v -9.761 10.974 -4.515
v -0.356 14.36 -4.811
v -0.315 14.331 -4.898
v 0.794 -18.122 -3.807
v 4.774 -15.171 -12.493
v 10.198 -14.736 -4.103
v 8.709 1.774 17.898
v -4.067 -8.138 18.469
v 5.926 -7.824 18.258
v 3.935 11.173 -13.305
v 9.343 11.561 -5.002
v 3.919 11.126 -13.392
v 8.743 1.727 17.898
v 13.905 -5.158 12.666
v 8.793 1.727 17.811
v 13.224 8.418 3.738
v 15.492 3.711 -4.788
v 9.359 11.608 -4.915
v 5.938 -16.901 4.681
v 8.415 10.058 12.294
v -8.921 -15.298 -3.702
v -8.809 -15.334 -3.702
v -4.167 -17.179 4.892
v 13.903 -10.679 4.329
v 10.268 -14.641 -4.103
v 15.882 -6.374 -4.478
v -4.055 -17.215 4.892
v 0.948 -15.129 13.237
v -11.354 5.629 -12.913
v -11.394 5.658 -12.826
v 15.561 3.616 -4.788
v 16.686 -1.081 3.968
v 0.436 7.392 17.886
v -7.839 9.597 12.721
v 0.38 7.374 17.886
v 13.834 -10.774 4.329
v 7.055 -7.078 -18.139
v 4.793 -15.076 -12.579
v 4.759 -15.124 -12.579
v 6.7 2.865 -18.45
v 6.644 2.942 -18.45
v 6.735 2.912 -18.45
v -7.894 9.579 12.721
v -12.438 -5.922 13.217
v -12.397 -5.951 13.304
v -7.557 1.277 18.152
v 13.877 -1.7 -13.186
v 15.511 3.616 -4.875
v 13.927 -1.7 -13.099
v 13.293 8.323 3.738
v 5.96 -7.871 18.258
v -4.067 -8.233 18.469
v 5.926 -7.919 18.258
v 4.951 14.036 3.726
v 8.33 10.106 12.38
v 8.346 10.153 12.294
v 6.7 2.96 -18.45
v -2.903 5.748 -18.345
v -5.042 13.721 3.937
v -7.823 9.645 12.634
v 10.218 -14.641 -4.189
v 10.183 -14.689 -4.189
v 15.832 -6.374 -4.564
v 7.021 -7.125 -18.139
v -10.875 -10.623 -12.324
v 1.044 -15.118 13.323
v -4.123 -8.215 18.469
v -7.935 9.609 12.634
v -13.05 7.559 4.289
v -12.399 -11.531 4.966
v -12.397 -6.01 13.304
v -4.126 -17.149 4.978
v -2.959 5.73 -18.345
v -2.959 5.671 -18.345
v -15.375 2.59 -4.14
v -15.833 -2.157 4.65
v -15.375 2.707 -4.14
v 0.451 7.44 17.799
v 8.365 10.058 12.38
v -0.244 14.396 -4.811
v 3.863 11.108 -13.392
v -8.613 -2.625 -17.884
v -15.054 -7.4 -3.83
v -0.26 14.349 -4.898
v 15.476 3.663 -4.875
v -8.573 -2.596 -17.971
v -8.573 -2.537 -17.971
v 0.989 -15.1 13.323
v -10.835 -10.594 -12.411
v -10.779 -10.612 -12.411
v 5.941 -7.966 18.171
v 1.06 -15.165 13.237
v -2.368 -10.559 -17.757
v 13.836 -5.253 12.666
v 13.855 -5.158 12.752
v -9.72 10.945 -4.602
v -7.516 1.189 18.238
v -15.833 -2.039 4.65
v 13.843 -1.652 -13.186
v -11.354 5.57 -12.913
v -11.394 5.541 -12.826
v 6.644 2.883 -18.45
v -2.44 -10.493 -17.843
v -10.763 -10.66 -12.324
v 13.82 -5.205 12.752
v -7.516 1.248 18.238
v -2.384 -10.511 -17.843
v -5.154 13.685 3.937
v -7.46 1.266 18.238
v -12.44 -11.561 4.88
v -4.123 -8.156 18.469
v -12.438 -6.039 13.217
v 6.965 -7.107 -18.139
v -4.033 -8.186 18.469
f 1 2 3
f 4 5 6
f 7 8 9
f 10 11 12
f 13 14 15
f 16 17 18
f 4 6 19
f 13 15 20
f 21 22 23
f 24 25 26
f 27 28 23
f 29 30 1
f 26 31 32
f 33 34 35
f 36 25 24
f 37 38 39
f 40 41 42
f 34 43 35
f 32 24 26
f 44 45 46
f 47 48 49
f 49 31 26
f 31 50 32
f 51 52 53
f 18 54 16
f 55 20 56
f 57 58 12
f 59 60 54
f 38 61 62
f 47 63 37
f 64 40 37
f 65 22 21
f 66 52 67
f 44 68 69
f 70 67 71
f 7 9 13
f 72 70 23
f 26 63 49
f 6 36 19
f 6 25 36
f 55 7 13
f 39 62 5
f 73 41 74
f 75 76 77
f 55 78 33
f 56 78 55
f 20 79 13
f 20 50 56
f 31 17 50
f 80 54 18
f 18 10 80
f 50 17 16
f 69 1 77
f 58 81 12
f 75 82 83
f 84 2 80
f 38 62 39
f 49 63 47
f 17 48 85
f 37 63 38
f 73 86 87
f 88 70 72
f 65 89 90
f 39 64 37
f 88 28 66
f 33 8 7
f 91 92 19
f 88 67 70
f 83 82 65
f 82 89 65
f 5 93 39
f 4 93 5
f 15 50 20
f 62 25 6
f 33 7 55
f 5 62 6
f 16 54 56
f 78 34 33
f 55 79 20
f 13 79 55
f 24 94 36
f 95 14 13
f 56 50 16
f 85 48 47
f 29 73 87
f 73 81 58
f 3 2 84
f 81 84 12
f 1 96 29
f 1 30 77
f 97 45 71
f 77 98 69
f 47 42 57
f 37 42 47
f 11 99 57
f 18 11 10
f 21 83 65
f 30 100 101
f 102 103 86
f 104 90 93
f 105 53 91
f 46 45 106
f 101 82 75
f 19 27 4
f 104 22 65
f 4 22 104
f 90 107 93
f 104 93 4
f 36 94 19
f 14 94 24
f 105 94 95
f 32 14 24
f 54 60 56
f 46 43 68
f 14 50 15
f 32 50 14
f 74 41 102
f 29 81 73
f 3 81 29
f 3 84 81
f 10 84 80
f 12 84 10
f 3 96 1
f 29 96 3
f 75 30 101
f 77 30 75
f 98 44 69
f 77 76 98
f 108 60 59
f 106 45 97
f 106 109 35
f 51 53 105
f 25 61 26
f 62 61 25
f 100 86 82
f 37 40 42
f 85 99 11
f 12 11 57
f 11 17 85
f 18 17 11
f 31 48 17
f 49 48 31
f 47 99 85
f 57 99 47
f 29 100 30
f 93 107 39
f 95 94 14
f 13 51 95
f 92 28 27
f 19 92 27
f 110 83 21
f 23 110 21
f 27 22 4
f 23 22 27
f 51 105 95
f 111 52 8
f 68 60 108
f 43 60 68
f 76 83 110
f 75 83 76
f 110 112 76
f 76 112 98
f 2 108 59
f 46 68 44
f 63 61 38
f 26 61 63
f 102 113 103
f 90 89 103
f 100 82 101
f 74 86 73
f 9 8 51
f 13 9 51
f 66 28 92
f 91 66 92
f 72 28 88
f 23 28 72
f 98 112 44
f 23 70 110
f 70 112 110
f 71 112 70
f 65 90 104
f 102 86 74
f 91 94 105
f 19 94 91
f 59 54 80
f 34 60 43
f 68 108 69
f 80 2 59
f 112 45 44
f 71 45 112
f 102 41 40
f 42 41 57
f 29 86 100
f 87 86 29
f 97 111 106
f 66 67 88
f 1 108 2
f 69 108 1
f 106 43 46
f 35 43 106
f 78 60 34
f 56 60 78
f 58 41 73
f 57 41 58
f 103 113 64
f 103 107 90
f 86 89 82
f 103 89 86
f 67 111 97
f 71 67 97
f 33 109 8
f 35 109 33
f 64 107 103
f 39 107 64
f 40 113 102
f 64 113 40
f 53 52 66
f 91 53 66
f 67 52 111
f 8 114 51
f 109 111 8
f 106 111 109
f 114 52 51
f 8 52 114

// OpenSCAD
// Auto-generated OpenSCAD file

    inner_points = 10*[[0.6684524443178234, 0.2912194859296234, -1.8363167690860016], [0.5910161587361856, -0.7871337989465796, 1.8171417764513753], [-0.2918345035641626, 0.5700386873175909, -1.8258845754108513], [0.7005256026010808, -0.7077839963284758, -1.8052788091992973], [0.8693085877915654, 0.17268677431141555, 1.78111690891311], [-0.4082680905441584, -0.8185618492857674, 1.8381956785148106], [-0.8532513180248714, -0.25664505176664254, -1.7883991652556823], [-0.2399390433352969, -1.0463829018555162, -1.7756641013727077], [0.04201851847921482, 0.7344604613470775, 1.7799062183976844], [-0.747567291966454, 0.12183512066246743, 1.8151828380475596], [-1.0794361675796518, -1.0564562485718862, -1.2323933529687556], [-0.785395180165941, 0.954977290682234, 1.26341914278561], [-1.1313316278085175, 0.5599653406012208, -1.2826138270068992], [0.4743407530463006, -1.5075951931337195, -1.2492729969123706], [0.8314806995920784, 1.005828944331182, 1.2293532136511605], [-1.2356817891893142, -0.598045019950611, 1.3217086029027356], [0.3903721345341776, 1.107829878297487, -1.3305314308372185], [1.3827322406994211, -0.1699928053485799, -1.3099256646256645], [1.3804783398490494, -0.5157653159624755, 1.266588771704851], [0.10290166151332539, -1.5070139395596582, 1.3236675413065515], [-0.9679627459509822, 1.0915308609299377, -0.45150089482603184], [1.0167574663795047, -1.4641145063621959, -0.41028936240292346], [1.3192715310196481, 0.8322870325903506, 0.3738163590127774], [-1.2358818256517996, -1.1502102146040154, 0.4879738982161779], [0.9327888478673815, 1.1513105650690107, -0.49154779632777174], [-1.4973064021284335, -0.7341563604123948, -0.38297752478415814], [1.546101122556956, 0.36157271498013704, -0.4788127324447971], [-0.8839941274388591, -1.5238942105012685, -0.3702424609011835], [-0.5073027875730468, 1.3626326692868251, 0.393659570560787], [-1.2968885980187155, 0.7500073286022151, 0.4289361902106621], [1.380278303386564, -1.0679305106158798, 0.43285406701829315], [0.5906924929408951, -1.6805558513004897, 0.46813068666816826], [-0.027498100014604697, 1.4301297664569783, -0.4811156026526214], [-1.5293795604116909, 0.2648471218457043, -0.4140154846708627], [1.5781742808402135, -0.6374307672779622, -0.44777477255809256], [0.07629282044312705, -1.8027134118892363, -0.38067465457633387], [0.49198146170729756, 1.3940607196260126, 0.3726056684973519], [-1.5751810270740951, -0.2098132446557805, 0.4649610577489272], [1.6585707324419436, -0.10810993735788438, 0.39682919948002804], [-0.40859175633944894, -1.7119839016396772, 0.48918458873160336]];

    outer_points = 10*[[1.104376346611005, -1.5961573617657159, 0.4728512902850581], [-0.673634048825412, 1.769605898412857, 0.6369190794461355], [0.893817731891513, -1.7160073529394246, -0.4973554141769706], [0.2569582435104783, -1.7160073529394246, 0.990073233123108], [0.2858087158543201, 1.9345652594329796, 0.40831901270173326], [-1.1703713108325864, 1.6046465373927346, -0.21516102344645555], [-0.08373275172975375, -1.9099287122098603, -0.5797541908094787], [-0.4773335616071019, -1.9099287122098603, 0.3395272690622494], [0.3820396926793872, 1.8715563902857573, -0.585043701269393], [-0.5179290575518498, 1.667655406539957, -0.9703755549159867], [-0.9984278133317204, -1.5355652274301959, -0.42748822105720446], [0.3014721351224021, 1.2549195998361895, -1.3681579568754045], [0.3727234801668946, -1.3416438681597602, -1.2643709042964242], [-0.6577368180914882, -1.3416438681597602, 1.1423392028753823], [1.1052099085285718, 1.5218294527292122, 0.010536610742315433], [-1.2509388683895712, 0.9880097469431668, -0.9982752790524669], [1.5608325785076533, -1.0278725177156156, -0.21176542320188751], [0.9239730901266188, -1.0278725177156156, 1.275663224098191], [0.04953616702377289, 1.419878960856312, 1.2324993914578442], [-1.4066438596631334, 1.089960238816067, 0.6090193553096552], [0.7176843678750273, -0.42213967519526474, -1.452822556112823], [-0.556034608887042, -0.42213967519526474, 1.5220347384873343], [1.3753551471929137, 0.7520583972355097, 0.5888739449609331], [-1.537004906180899, 0.09222095315501971, -0.6580861273354446], [1.6625347877120995, -0.10836832475112018, 0.1679301124100645], [-1.1072842188467662, -0.7359110256394092, -1.0179993899072812], [1.2689339778347515, -0.10836832475112018, 1.0872115722817925], [-1.5008850287241142, -0.7359110256394092, -0.09871793003555307], [0.9748488620108067, 0.524090167068165, -1.2565688719027843], [0.07488011177956955, 0.3201891833223645, -1.641900725549378], [-0.23652987076755477, 0.524090167068165, 1.5726885431748667], [-1.136498620998792, 0.3201891833223645, 1.187356689528273], [1.4519761729926075, -0.228218315924829, -0.8022765920519641], [-0.2598661157462394, -0.6160610344657005, -1.5352213327453308], [0.4215158747342246, -0.228218315924829, 1.6044335151198423], [-1.2903264140046222, -0.6160610344657005, 0.8714887744264755], [1.4715861240179806, 0.6890495280882876, -0.4044887690101932], [-0.8845626529001624, 0.15522982230224197, -1.4133006588049757], [0.7229128939121772, 0.6890495280882876, 1.3440884764304641], [-1.633235883005966, 0.15522982230224197, 0.3352765866356817]];

    // Convex hull for inner set (I)
    module inner_hull() {
        hull() {
            for (p = inner_points) {
                translate(p) sphere(r=0.1);
            }
        }
    }

    // Convex hull for outer set (O) minus inner hull (O \ I)
    module outer_minus_inner() {
        difference() {
            hull() {
                for (p = outer_points) {
                    translate(p) sphere(r=0.1);
                }
            }
            inner_hull(); // Subtract inner hull
        }
    }

    // Convex hull for outer set (O) minus all translated inner hulls
    module outer_minus_AllTranslationInner() {
        difference() {
            hull() {
                for (p = outer_points) {
                    translate(p) sphere(r=0.1);
                }
            }
            hull() {
                translate([0,0,50]) inner_hull();
                translate([0,0,-50]) inner_hull();
            }; // Subtract translated inner hulls
        }
    }

    // Difference between outer_minus_inner and outer_minus_AllTranslationInner
    module outer_minus_inner_diff() {
        difference() {
            // Outer minus inner
            difference() {
                hull() {
                    for (p = outer_points) {
                        translate(p) sphere(r=0.1);
                    }
                }
                inner_hull();
            }

            // Subtract Outer minus AllTranslationInner
            difference() {
                hull() {
                    for (p = outer_points) {
                        translate(p) sphere(r=0.1);
                    }
                }
                hull() {
                    translate([0,0,50]) inner_hull();
                    translate([0,0,-50]) inner_hull();
                };
            }
        }
    }

    // Rendering all with colors applied
    color([1, 0, 0, 0.5]) inner_hull(); // Transparent red
    
